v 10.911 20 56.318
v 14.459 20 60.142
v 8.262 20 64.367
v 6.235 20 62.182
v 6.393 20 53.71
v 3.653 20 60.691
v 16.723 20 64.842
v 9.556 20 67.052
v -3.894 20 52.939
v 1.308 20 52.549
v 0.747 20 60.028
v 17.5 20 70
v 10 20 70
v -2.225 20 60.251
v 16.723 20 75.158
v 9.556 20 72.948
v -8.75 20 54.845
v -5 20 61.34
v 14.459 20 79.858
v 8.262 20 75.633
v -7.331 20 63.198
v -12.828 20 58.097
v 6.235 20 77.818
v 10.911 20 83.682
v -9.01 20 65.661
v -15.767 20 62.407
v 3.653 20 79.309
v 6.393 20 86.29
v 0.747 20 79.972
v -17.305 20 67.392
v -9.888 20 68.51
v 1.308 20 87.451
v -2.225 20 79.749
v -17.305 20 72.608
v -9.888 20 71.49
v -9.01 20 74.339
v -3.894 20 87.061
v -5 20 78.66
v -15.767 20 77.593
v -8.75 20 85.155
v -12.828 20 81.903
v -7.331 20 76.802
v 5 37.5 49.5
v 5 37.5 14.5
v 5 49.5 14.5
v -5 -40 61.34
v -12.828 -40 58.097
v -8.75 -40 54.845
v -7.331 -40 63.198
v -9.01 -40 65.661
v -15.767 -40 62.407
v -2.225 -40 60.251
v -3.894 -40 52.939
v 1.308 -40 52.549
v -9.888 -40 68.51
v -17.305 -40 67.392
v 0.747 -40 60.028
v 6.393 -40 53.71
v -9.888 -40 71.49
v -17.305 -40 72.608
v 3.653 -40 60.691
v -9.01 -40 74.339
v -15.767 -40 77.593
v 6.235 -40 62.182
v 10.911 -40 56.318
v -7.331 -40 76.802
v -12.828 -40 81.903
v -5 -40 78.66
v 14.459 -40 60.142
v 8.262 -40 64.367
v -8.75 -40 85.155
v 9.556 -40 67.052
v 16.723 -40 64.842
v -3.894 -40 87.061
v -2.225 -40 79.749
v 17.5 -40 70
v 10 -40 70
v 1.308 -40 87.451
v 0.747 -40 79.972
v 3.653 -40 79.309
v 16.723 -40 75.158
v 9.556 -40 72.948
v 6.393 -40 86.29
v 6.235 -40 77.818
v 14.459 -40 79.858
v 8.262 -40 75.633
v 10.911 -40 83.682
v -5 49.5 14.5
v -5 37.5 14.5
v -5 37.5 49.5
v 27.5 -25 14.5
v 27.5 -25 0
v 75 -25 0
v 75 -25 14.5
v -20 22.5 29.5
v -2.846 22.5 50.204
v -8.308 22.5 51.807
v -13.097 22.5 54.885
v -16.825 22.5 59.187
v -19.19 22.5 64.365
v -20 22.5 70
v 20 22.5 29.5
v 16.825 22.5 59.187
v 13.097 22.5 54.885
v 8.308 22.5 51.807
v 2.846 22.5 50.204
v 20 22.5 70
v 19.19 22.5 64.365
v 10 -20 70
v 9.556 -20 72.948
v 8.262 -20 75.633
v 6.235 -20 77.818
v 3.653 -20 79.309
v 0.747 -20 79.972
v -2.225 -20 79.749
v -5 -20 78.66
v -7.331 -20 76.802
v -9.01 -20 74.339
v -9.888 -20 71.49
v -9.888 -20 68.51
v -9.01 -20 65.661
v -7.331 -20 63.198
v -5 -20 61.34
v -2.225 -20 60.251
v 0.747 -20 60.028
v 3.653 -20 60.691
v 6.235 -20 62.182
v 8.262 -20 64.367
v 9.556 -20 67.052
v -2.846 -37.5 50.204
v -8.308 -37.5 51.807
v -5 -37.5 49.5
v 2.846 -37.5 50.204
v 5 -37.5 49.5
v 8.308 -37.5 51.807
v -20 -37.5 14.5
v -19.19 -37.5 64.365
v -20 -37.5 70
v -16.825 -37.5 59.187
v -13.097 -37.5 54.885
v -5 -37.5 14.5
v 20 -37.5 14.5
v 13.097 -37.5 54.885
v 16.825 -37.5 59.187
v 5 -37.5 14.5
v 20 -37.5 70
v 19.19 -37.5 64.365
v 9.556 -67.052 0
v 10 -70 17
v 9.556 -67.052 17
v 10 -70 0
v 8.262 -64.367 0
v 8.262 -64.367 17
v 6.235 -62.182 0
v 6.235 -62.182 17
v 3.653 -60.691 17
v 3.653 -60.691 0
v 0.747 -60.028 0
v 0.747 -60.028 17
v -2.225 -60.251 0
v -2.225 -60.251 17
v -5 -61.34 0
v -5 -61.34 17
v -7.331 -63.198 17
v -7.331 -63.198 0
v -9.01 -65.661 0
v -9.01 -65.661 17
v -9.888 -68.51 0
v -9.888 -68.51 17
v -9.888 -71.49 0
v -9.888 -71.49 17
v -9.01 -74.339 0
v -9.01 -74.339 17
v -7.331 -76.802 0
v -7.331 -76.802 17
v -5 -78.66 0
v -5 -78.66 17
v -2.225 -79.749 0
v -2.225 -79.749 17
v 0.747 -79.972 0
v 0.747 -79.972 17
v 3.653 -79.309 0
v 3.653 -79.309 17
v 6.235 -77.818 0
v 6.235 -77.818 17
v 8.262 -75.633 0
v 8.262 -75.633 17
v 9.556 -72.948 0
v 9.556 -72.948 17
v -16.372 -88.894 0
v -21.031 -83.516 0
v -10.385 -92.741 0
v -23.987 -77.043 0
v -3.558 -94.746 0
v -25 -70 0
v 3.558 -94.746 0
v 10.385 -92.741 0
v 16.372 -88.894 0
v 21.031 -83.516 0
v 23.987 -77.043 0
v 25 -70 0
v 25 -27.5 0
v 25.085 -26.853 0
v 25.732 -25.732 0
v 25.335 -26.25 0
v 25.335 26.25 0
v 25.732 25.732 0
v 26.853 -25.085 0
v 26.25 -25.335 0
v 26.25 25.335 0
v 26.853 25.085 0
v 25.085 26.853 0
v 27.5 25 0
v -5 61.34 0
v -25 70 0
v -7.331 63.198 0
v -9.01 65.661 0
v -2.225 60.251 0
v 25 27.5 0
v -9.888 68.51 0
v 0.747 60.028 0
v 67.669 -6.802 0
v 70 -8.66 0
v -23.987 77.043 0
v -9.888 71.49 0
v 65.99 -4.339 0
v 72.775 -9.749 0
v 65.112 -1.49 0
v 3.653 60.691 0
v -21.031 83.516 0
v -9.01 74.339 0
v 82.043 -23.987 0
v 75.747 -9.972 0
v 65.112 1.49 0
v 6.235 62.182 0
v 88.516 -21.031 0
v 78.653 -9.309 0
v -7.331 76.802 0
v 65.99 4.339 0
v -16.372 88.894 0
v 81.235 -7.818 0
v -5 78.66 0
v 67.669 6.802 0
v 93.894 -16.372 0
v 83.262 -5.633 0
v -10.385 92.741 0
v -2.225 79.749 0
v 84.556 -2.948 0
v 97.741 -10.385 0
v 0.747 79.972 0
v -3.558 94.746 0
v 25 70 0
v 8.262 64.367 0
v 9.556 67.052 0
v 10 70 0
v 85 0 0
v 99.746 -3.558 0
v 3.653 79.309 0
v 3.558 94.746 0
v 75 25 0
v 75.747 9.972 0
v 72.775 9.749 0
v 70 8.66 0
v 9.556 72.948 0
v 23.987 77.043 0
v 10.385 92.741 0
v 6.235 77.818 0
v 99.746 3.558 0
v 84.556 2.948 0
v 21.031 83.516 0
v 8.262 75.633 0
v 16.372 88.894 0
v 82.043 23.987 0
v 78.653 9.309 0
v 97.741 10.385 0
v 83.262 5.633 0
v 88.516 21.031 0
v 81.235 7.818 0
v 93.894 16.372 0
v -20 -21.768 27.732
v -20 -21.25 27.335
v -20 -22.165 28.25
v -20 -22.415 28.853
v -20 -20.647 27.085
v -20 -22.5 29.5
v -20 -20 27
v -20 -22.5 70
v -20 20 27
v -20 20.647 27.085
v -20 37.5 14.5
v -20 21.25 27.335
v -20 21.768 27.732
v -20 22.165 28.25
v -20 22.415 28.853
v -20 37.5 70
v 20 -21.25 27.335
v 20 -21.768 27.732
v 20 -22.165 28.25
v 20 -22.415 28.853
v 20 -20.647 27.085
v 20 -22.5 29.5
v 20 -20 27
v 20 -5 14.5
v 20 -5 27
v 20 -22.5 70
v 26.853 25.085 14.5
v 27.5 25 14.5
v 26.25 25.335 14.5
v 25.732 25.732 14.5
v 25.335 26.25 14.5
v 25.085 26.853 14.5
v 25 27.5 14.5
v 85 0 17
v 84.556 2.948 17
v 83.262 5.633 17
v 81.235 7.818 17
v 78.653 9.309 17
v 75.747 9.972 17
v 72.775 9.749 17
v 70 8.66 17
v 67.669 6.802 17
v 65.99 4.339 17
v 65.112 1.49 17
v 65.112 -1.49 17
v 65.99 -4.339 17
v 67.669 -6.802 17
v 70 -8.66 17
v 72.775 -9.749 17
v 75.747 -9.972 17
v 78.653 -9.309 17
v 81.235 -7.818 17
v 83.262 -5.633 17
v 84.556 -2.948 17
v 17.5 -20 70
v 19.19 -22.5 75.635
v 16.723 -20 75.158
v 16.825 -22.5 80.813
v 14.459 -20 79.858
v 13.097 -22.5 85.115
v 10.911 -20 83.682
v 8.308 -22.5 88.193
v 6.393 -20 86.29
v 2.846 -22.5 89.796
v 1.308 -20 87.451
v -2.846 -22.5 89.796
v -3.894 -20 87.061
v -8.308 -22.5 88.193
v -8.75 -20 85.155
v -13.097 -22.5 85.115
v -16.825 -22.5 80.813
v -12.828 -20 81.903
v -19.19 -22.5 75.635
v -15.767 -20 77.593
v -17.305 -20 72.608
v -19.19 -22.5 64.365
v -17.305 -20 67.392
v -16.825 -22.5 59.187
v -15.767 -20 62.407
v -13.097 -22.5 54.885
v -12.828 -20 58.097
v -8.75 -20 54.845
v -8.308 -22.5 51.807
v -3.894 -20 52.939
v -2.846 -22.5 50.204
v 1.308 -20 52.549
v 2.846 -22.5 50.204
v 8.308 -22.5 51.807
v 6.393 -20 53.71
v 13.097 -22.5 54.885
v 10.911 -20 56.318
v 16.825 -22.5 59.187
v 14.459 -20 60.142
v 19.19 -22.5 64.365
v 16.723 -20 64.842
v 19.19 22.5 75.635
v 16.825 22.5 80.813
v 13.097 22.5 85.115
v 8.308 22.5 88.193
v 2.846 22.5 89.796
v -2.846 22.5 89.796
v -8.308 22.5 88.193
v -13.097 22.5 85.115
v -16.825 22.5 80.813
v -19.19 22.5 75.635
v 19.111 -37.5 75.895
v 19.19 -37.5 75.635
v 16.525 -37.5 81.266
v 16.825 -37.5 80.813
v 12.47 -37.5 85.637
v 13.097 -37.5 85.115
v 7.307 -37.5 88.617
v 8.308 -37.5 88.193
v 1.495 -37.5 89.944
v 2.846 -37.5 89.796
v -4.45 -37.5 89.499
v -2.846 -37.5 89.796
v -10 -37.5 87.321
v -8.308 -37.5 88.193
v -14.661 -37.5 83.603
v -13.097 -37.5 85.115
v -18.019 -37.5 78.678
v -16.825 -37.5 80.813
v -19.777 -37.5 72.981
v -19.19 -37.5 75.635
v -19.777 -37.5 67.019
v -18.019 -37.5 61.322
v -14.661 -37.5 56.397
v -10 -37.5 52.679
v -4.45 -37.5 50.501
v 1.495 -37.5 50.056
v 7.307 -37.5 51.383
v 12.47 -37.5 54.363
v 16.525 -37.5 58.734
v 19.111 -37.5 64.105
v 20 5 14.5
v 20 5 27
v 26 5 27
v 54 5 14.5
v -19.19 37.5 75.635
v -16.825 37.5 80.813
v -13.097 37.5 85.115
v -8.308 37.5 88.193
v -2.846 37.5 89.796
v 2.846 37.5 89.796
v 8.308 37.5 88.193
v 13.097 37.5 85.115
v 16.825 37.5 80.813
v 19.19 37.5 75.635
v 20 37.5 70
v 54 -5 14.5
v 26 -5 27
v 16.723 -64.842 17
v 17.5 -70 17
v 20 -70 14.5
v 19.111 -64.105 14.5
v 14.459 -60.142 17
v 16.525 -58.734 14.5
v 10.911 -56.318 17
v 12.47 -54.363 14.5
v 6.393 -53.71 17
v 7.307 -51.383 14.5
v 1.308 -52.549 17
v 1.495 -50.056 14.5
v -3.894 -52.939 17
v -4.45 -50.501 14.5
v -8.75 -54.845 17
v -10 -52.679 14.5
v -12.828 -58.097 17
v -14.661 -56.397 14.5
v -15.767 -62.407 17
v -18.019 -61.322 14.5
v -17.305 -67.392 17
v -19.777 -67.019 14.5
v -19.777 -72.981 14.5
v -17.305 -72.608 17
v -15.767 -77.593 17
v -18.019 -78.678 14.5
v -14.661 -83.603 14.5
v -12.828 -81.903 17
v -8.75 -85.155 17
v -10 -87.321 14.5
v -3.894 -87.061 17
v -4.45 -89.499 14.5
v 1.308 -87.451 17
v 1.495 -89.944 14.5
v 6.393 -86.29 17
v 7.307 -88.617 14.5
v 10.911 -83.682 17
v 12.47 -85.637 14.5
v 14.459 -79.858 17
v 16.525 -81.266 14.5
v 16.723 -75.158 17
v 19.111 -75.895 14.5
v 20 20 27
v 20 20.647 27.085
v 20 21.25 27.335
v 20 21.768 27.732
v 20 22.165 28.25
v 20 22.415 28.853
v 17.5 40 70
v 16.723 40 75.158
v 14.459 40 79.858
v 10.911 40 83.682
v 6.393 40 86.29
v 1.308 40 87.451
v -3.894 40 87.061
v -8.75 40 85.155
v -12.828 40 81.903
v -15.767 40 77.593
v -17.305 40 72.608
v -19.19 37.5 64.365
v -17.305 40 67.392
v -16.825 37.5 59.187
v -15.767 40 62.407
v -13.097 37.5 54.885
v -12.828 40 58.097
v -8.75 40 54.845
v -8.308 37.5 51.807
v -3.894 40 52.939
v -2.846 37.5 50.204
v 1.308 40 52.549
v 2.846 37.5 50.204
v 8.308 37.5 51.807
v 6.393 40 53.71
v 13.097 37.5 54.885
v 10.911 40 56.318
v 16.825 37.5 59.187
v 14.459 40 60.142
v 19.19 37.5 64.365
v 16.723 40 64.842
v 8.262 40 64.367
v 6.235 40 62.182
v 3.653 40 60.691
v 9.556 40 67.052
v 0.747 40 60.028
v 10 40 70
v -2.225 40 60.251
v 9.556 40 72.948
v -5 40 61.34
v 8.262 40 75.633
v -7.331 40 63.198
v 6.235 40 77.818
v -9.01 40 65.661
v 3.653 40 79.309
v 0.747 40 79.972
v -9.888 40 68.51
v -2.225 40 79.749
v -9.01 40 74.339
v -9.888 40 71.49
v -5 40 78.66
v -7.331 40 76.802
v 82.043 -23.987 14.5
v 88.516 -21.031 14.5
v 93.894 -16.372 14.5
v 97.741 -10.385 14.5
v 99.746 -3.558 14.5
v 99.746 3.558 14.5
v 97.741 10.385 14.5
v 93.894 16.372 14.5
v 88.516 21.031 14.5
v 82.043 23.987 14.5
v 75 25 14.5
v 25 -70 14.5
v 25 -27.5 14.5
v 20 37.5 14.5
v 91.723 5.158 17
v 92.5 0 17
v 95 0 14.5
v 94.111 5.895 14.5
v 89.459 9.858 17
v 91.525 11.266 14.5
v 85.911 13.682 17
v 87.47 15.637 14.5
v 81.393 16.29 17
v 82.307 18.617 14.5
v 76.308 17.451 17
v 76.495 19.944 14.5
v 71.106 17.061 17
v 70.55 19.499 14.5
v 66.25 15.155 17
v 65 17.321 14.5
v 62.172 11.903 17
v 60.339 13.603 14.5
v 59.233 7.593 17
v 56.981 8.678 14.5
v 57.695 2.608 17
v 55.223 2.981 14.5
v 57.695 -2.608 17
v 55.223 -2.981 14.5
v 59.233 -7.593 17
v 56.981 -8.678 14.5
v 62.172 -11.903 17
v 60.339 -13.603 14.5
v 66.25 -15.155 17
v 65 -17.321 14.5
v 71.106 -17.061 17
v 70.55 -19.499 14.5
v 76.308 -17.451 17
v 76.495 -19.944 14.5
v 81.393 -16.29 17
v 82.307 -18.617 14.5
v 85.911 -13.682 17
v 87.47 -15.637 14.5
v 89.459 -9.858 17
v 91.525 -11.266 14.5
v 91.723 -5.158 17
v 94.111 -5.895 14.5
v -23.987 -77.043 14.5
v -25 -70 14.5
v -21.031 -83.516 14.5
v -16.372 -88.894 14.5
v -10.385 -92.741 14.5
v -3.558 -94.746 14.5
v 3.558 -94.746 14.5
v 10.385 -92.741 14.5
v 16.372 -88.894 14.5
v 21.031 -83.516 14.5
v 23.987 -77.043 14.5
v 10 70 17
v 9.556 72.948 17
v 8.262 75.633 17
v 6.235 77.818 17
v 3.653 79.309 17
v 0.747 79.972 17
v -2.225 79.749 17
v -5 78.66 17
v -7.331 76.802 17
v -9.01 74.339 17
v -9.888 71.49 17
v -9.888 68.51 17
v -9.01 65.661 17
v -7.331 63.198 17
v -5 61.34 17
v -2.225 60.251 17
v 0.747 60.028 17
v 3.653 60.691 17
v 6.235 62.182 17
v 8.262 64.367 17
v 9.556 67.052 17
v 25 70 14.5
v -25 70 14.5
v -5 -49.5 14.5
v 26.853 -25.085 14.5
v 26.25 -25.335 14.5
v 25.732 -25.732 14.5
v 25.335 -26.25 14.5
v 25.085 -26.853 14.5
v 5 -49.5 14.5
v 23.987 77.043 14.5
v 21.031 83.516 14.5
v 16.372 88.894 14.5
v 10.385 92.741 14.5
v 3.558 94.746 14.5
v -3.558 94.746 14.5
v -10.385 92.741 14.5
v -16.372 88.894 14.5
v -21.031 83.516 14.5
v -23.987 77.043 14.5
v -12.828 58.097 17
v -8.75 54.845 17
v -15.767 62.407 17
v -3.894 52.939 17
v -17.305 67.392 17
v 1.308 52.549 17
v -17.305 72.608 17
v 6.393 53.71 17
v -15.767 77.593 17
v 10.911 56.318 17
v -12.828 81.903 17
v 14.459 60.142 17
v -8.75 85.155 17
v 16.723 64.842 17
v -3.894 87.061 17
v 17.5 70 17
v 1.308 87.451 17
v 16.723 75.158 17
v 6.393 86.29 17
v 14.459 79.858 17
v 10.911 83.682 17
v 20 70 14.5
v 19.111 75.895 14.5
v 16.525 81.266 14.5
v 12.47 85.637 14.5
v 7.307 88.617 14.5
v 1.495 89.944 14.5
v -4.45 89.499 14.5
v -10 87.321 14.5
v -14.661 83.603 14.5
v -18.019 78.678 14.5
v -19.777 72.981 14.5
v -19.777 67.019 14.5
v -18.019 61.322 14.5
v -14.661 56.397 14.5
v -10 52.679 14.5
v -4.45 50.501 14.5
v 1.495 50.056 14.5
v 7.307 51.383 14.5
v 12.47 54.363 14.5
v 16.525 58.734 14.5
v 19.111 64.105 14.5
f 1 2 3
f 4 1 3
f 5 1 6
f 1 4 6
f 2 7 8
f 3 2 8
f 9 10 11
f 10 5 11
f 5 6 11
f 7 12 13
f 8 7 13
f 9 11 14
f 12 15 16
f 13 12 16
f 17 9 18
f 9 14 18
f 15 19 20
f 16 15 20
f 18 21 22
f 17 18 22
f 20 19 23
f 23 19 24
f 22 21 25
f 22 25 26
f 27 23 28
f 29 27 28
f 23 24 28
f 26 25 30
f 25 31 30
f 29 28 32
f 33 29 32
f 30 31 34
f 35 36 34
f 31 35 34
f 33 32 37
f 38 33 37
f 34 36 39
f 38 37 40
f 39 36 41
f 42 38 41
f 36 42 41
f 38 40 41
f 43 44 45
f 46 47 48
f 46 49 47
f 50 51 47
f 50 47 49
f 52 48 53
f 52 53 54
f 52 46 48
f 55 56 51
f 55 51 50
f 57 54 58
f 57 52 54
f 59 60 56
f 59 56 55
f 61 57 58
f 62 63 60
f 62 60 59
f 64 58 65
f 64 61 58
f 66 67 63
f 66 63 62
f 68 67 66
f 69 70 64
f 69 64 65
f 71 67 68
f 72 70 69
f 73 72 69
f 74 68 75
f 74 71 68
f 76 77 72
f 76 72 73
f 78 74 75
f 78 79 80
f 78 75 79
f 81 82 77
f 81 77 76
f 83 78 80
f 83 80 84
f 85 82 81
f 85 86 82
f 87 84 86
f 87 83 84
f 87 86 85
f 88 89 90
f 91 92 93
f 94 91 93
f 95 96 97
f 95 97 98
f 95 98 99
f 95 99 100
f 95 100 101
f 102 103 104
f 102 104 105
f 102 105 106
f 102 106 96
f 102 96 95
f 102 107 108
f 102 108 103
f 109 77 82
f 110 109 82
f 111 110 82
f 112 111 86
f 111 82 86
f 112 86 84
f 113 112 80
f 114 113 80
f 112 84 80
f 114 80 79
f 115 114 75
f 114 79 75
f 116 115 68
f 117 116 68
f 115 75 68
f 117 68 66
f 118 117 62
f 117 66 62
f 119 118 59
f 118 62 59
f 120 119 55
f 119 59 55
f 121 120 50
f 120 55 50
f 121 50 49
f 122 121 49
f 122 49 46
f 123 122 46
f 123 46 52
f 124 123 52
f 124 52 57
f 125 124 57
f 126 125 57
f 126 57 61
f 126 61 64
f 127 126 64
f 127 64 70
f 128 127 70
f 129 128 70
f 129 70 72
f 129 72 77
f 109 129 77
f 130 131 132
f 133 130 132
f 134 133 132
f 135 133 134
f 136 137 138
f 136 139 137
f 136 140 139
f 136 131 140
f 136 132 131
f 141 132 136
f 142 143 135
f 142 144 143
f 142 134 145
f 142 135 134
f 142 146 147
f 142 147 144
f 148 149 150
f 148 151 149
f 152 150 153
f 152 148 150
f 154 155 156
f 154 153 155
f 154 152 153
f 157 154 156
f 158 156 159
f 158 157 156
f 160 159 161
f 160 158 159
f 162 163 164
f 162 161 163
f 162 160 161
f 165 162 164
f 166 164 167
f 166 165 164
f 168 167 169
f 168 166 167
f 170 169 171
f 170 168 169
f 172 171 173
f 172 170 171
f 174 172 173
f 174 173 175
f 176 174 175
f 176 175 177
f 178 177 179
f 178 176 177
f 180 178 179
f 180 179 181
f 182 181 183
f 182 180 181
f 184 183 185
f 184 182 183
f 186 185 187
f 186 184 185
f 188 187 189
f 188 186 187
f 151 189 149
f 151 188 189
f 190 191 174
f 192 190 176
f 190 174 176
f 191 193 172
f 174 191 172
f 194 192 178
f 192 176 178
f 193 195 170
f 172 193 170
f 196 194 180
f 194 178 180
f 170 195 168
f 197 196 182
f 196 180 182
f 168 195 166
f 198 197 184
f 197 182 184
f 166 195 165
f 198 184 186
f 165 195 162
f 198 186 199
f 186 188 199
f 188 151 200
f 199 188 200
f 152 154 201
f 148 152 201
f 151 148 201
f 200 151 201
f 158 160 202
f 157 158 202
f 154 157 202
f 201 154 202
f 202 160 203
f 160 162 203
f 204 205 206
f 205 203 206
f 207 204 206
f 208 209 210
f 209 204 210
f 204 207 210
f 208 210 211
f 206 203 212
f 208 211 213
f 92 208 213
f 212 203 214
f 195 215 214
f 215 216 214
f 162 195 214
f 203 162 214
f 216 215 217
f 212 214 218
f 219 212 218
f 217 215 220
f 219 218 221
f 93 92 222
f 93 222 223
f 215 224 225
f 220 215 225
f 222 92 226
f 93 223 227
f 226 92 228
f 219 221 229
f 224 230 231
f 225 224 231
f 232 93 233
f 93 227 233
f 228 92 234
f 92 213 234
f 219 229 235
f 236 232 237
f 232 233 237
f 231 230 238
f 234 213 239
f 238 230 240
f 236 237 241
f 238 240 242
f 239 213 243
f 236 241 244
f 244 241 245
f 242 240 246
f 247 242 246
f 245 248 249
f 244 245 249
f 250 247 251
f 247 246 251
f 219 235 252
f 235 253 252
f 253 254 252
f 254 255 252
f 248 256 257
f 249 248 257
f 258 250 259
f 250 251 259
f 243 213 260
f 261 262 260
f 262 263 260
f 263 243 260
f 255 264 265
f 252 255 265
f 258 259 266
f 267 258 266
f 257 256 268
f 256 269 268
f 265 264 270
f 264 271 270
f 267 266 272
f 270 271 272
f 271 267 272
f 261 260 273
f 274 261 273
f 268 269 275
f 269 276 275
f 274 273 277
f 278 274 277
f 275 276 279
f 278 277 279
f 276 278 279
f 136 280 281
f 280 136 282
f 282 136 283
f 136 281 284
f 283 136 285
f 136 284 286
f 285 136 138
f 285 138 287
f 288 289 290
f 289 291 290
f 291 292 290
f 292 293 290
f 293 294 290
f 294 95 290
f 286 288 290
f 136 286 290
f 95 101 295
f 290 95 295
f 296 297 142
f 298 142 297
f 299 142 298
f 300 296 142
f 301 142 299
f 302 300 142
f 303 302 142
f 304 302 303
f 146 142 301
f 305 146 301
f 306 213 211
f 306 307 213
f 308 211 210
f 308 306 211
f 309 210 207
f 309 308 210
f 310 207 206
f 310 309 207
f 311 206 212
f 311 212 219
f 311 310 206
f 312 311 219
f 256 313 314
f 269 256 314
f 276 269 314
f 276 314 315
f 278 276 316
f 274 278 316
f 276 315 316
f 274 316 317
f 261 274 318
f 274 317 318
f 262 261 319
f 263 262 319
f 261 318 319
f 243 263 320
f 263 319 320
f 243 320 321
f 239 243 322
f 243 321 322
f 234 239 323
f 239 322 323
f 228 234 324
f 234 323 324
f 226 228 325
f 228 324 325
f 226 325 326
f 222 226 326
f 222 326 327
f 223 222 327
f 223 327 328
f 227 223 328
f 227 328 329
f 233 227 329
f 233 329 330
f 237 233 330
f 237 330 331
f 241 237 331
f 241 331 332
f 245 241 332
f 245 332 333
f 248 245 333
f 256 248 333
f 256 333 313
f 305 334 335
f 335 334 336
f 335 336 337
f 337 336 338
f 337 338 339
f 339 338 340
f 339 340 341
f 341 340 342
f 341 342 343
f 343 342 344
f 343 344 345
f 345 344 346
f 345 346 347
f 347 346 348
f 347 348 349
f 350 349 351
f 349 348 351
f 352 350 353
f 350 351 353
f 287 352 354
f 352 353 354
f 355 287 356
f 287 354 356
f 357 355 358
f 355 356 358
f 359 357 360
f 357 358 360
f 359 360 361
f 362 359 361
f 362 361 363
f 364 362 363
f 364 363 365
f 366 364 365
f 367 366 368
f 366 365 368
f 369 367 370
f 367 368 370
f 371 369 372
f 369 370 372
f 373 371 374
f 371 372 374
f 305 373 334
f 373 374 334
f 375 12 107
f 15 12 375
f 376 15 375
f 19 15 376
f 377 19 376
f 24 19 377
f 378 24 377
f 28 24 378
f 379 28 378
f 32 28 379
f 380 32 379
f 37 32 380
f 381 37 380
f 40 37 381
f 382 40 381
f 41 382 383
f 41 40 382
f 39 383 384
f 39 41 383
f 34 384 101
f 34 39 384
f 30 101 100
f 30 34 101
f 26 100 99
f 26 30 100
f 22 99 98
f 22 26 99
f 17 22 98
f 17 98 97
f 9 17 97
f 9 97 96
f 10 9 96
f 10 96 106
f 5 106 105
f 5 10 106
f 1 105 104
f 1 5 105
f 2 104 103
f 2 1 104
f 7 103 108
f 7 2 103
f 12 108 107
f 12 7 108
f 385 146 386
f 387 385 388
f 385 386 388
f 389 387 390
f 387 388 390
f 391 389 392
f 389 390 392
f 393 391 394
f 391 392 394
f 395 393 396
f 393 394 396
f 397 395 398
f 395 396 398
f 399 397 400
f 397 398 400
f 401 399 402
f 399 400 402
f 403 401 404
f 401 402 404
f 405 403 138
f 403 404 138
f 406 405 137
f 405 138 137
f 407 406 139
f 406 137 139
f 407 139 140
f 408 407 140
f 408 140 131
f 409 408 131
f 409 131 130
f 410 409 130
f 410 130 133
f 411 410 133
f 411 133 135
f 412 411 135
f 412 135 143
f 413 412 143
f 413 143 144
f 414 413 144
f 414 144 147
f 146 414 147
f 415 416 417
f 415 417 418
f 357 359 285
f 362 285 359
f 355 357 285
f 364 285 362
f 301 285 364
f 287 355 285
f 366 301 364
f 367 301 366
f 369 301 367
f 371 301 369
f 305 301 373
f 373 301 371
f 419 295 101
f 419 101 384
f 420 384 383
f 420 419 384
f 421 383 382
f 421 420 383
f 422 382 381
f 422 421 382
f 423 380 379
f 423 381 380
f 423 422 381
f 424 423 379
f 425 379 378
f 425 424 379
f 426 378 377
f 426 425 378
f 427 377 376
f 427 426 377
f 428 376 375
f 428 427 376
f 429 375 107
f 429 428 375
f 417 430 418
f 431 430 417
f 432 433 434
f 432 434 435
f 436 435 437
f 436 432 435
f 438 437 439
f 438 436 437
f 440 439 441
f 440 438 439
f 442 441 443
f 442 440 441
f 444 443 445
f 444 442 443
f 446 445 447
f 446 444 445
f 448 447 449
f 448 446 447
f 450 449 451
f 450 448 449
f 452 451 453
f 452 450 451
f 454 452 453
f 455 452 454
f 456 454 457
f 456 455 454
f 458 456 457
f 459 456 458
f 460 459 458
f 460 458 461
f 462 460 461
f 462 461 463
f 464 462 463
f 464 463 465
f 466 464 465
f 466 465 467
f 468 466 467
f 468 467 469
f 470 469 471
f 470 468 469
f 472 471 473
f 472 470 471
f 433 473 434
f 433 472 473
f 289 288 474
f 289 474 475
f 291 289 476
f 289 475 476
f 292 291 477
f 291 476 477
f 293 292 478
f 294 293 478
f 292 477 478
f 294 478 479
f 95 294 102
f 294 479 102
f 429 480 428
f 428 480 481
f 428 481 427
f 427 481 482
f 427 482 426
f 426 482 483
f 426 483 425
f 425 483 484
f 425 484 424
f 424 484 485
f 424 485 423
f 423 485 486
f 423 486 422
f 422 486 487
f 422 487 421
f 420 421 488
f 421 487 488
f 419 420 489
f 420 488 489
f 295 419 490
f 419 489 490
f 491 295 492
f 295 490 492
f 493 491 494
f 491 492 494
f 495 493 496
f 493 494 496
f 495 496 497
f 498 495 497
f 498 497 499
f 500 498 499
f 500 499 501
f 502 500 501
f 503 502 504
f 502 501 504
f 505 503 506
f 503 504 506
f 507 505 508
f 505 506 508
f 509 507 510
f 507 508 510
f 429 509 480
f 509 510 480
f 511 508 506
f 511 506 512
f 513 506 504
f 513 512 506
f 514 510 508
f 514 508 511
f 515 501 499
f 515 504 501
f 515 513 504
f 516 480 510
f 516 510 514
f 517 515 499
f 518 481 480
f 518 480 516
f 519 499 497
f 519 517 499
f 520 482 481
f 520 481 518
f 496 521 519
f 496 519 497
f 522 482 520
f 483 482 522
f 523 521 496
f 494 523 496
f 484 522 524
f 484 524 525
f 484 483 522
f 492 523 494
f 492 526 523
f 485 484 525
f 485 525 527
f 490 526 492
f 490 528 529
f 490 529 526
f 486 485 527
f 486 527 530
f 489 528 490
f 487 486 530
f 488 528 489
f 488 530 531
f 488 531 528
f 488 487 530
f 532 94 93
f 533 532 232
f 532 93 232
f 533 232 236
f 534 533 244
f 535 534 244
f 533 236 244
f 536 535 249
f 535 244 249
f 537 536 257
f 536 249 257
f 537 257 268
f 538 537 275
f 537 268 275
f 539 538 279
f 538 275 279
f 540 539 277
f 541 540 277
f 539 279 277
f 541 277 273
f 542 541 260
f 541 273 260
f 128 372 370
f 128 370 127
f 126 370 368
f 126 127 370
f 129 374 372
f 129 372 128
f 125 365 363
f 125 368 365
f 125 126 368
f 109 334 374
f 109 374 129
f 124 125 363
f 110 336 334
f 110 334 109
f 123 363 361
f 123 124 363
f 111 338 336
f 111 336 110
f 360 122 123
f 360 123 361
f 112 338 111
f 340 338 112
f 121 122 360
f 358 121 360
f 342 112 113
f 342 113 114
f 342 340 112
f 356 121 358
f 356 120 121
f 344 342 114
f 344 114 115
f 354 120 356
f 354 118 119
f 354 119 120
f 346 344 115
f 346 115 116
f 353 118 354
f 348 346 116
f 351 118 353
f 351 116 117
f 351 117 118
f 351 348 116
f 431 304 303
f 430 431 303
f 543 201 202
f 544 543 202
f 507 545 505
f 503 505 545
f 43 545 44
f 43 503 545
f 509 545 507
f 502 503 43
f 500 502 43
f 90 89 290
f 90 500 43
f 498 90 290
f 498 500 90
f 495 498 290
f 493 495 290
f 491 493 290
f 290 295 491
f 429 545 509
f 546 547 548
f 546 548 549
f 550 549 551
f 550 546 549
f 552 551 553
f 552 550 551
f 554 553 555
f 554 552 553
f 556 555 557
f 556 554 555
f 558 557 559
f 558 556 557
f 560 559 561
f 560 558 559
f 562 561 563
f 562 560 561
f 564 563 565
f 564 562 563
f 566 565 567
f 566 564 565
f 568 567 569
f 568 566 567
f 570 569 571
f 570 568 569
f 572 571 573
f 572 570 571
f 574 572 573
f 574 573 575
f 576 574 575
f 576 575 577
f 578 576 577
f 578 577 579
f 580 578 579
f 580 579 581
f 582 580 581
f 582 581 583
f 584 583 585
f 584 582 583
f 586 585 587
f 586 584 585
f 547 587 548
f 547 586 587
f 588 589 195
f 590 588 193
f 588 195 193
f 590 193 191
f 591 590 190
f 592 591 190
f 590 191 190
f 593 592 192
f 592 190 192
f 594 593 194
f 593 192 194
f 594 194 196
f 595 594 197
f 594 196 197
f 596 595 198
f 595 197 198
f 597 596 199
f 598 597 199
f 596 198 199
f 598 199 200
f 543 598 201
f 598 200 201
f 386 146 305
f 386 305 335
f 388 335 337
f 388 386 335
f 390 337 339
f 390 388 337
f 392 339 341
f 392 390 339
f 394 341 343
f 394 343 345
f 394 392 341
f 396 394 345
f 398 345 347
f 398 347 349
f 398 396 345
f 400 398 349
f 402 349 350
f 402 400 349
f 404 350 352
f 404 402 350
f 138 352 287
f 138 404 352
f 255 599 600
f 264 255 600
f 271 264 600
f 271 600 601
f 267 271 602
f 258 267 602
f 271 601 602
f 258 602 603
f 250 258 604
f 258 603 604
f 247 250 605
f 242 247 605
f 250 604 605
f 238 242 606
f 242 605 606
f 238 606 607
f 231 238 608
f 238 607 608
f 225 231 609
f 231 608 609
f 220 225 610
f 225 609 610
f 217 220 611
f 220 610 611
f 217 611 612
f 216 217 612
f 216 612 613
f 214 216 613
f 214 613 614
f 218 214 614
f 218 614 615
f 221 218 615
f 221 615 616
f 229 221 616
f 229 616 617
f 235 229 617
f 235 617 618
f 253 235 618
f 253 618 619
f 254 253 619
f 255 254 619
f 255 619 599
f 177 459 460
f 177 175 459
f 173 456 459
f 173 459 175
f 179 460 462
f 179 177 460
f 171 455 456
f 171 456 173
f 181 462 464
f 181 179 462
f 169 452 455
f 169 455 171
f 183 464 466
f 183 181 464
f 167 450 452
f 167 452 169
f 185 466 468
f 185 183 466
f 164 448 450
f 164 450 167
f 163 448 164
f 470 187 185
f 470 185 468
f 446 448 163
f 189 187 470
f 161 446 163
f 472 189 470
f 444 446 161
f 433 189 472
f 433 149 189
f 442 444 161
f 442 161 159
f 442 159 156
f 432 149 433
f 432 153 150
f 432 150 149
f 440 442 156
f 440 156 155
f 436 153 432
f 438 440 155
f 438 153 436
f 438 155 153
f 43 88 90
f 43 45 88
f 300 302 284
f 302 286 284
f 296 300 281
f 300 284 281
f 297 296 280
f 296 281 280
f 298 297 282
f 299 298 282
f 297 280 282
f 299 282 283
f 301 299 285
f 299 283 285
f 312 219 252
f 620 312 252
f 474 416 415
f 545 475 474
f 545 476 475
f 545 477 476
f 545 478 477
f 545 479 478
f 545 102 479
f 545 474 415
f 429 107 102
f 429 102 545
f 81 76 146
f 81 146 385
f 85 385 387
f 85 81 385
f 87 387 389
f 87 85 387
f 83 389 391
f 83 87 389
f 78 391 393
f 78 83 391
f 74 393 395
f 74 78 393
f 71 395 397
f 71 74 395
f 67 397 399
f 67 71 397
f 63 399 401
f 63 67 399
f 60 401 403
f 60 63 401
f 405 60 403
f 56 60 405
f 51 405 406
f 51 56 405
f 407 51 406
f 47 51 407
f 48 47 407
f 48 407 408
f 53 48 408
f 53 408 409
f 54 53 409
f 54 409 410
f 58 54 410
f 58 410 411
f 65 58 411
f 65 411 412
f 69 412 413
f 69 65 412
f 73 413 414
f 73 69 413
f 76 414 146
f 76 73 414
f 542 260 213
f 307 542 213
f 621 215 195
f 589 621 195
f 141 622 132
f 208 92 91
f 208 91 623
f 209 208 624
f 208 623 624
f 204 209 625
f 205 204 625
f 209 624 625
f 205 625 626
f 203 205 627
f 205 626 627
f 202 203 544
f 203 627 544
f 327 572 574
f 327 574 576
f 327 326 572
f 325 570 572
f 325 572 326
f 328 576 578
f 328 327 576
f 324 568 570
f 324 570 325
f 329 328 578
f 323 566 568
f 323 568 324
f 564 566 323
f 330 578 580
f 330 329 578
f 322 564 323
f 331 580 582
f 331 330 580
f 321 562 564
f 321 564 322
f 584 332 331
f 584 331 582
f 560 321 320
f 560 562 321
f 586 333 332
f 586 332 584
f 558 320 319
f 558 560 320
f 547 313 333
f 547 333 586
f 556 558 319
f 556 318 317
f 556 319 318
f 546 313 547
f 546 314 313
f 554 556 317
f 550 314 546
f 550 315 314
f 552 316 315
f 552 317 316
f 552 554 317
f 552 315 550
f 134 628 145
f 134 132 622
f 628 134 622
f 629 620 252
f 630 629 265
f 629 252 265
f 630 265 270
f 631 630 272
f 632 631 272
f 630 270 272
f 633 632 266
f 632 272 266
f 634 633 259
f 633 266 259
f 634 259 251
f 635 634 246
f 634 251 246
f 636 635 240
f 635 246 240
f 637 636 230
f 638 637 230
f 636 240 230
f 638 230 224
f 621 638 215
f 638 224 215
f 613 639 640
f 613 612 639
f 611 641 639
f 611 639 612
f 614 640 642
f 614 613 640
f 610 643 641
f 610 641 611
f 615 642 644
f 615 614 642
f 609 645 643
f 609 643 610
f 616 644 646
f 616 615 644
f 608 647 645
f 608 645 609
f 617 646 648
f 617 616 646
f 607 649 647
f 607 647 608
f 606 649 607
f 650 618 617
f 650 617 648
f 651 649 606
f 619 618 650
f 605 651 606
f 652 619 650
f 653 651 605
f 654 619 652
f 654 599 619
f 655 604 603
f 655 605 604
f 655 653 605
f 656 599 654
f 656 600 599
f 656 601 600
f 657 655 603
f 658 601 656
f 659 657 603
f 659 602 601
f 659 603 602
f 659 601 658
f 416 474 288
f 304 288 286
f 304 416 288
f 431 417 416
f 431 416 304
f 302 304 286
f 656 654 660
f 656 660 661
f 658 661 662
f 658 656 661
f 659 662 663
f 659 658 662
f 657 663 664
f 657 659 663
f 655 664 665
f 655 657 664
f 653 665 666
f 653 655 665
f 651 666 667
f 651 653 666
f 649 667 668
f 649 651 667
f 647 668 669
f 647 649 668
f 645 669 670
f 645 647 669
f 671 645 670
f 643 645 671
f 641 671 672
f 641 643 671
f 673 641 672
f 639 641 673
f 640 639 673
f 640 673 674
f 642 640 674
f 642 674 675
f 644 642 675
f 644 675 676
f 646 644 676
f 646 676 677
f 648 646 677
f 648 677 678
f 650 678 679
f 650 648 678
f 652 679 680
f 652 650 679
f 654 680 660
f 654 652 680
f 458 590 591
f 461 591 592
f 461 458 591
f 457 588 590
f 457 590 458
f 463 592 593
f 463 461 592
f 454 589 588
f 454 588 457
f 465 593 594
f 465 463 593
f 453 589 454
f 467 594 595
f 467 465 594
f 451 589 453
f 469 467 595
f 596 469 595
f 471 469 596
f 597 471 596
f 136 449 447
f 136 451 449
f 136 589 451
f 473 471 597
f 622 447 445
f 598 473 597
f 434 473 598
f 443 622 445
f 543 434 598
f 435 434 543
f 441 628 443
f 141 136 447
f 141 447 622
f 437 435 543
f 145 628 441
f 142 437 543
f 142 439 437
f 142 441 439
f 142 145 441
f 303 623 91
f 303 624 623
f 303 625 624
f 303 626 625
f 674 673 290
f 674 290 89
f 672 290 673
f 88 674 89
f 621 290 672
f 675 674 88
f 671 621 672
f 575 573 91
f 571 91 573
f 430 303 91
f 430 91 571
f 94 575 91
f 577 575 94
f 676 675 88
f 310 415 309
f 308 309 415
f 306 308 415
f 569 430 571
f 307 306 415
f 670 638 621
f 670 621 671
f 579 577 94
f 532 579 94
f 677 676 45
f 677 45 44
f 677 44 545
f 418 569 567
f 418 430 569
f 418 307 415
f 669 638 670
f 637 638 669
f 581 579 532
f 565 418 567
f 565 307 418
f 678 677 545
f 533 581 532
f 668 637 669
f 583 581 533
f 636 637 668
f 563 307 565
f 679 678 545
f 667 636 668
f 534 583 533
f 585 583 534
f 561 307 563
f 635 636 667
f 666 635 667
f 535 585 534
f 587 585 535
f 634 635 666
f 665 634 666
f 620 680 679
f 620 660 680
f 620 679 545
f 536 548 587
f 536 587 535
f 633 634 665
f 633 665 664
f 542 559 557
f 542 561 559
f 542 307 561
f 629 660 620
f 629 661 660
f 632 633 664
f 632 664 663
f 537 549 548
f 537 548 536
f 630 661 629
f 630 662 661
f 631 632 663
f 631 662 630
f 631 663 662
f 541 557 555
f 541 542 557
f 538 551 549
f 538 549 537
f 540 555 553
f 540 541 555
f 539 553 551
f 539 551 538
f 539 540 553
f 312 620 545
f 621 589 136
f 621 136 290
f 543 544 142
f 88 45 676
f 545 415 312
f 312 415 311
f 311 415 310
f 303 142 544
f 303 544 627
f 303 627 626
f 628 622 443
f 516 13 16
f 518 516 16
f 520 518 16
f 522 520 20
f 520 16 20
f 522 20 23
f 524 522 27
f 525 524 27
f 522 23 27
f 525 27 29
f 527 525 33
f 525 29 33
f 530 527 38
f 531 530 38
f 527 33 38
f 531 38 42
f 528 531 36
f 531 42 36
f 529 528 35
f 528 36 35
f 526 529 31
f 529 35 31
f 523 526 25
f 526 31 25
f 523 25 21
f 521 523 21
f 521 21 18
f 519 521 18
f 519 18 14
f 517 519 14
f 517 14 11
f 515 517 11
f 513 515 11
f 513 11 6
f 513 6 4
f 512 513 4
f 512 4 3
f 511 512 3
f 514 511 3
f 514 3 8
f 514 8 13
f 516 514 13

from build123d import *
from build123d import SkipClean  # not in build123d's __all__

# Parameters (mm, degrees)
F1_DEPTH  = 14.5
F3_DEPTH  = 20
F5_DEPTH  = 5
F7_DEPTH  = 5
F9_DEPTH  = 2.5
F10_DEPTH = 15
F12_DEPTH = 2.5
F14_SIZE  = 2.49999
F16_DEPTH = 15
F18_DEPTH = 2.5
F22_R     = 20
F23_DEPTH = 2.5
F24_SIZE  = 2.49999
F25_R     = 10
F26_DEPTH = 17.001
F27_R     = 10
F28_DEPTH = 17.001
F29_R     = 10
F30_DEPTH = 135.001
F31_R     = 10
F32_DEPTH = 75.501
F33_R     = 10
F34_DEPTH = 90.001
F35_R     = 2.5


# Not quite as in the source:
# - a fillet or chamfer that OpenCascade refuses, or shapes differently, is made with other operations: its cross-section is extruded or revolved along the edge and cut away or added
# - a fillet or chamfer is up to 0.001 mm smaller than in the source, because OpenCascade refuses the exact size
# - a feature of the source that left no trace in its solid (it failed there, or was rolled back) is left out
# - a pattern or mirror of a feature is missing from the dataset's text; its kind, count and spacing are read off the source's solid


with BuildPart() as f1:
    # F0 (on Top) → F1 (new body)
    with BuildSketch(Plane.XY):
        with BuildLine():
            ThreePointArc((25, 70), (0, 95), (-25, 70))
            Line((-25, 70), (-25, -70))
            ThreePointArc((-25, -70), (0, -95), (25, -70))
            Line((25, -70), (25, -25))
            Line((25, -25), (75, -25))
            ThreePointArc((75, -25), (100, 0), (75, 25))
            Line((75, 25), (25, 25))
            Line((25, 25), (25, 70))
        make_face()
    extrude(amount=F1_DEPTH)

    # F2 (on Right) → F3 (join, symmetric)
    with BuildSketch(Plane.YZ):
        Polygon((-37.5, 70), (-37.5, 0), (37.5, 0), (37.5, 70), (22.5, 70), (22.5, 27), (-22.5, 27), (-22.5, 70), align=None)
    extrude(amount=F3_DEPTH, both=True)

    # F4 (on Right) → F5 (join, symmetric)
    with BuildSketch(Plane.YZ):
        Polygon((-37.5, 49.5), (-49.5, 14.5), (-37.5, 14.5), align=None)
        Polygon((37.5, 49.5), (37.5, 14.5), (49.5, 14.5), align=None)
    extrude(amount=F5_DEPTH, both=True)

    # F6 (on Front) → F7 (join, symmetric)
    with BuildSketch(Plane.XZ):
        Polygon((26, 27), (20, 27), (20, 14.5), (54, 14.5), align=None)
    extrude(amount=F7_DEPTH, both=True)

    # F8 (on face) → F9 (join)
    with BuildSketch(Plane.XZ.offset(37.5)):
        with BuildLine():
            ThreePointArc((-20, 70), (0, 50), (20, 70))
            Line((20, 70), (-20, 70))
        make_face()
        with BuildLine():
            Line((-20, 70), (20, 70))
            ThreePointArc((20, 70), (0, 90), (-20, 70))
        make_face()
    extrude(amount=F9_DEPTH)

    # F10 (add): a face of the model
    f10_faces = [f1.faces().sort_by_distance(p)[0] for p in [
        (0, -37.5, 78.4882636316),
    ]]
    extrude(f10_faces, amount=F10_DEPTH)

    # F11 (on face) → F12 (join)
    with BuildSketch(Plane(origin=(0, -22.5, 0), x_dir=(-1, 0, 0), z_dir=(0, 1, 0))):
        with BuildLine():
            ThreePointArc((-20, 70), (0, 50), (20, 70))
            ThreePointArc((20, 70), (0, 90), (-20, 70))
        make_face()
    f12 = extrude(amount=F12_DEPTH)

    # F12_copies: F12 across plane
    add(f12.mirror(Plane.ZX), clean=False)

    # F13: chamfer of 2.5 on 1 edges, made by hand

    # F13_s1 → F13_t2 (revolve, cut)
    with BuildSketch(Plane.XY.offset(70)):
        Polygon((20, -22.5), (17.5, -20), (20, -20), align=None)
    revolve(axis=Axis((0, -20, 70), (0, -1, 0)), mode=Mode.SUBTRACT)

    # F14 (size 2.5 in the source; OpenCascade refuses exactly that, so slightly less here)
    f14_edges = [f1.edges().sort_by_distance(p)[0] for p in [
        (-20, -40, 70),
    ]]
    chamfer(f14_edges, length=F14_SIZE)

    # F15 (on face) → F16 (join)
    with BuildSketch(Plane(origin=(0, 37.5, 0), x_dir=(-1, 0, 0), z_dir=(0, 1, 0))):
        with BuildLine():
            ThreePointArc((-20, 70), (0, 50), (20, 70))
            Line((20, 70), (-20, 70))
        make_face()
        with BuildLine():
            Line((-20, 70), (20, 70))
            ThreePointArc((20, 70), (0, 90), (-20, 70))
        make_face()
    extrude(amount=-F16_DEPTH)

    # F17 (on face) → F18 (join)
    with BuildSketch(Plane(origin=(0, 37.5, 0), x_dir=(-1, 0, 0), z_dir=(0, 1, 0))):
        with BuildLine():
            ThreePointArc((-20, 70), (0, 50), (20, 70))
            ThreePointArc((20, 70), (0, 90), (-20, 70))
        make_face()
    with SkipClean():  # cleaning this boolean's faces spoils the solid; the shape is the same uncleaned
        extrude(amount=F18_DEPTH)

    # F21: chamfer of 2.5 on 2 edges, made by hand

    # F21_s1 → F21_t2 (revolve, cut)
    with BuildSketch(Plane.XY.offset(70)):
        Polygon((20, 37.5), (17.5, 40), (20, 40), align=None)
    revolve(axis=Axis((0, 40, 70), (0, -1, 0)), mode=Mode.SUBTRACT)

    # F21_s3 → F21_t4 (revolve, cut)
    with BuildSketch(Plane.XY.offset(70)):
        Polygon((20, 22.5), (17.5, 20), (20, 20), align=None)
    revolve(axis=Axis((0, 20, 70), (0, -1, 0)), mode=Mode.SUBTRACT)

    # F22 (on face) → F23 (join)
    with BuildSketch(Plane.XY.offset(14.5)):
        with Locations((0, 70)):
            Circle(F22_R)
        with Locations((75, 0)):
            Circle(F22_R)
        with Locations((0, -70)):
            Circle(F22_R)
    extrude(amount=F23_DEPTH)

    # F24 (size 2.5 in the source; OpenCascade refuses exactly that, so slightly less here)
    f24_edges = [f1.edges().sort_by_distance(p)[0] for p in [
        (-20, 70, 17),
        (55, 0, 17),
        (-20, -70, 17),
    ]]
    chamfer(f24_edges, length=F24_SIZE)

    # F25 (on face) → F26 (cut, through all)
    with BuildSketch(Plane.XY.offset(17)):
        with Locations((0, 70)):
            Circle(F25_R)
    extrude(amount=-F26_DEPTH, mode=Mode.SUBTRACT)

    # F27 (on face) → F28 (cut, through all)
    with BuildSketch(Plane.XY.offset(17)):
        with Locations((75, 0)):
            Circle(F27_R)
    extrude(amount=-F28_DEPTH, mode=Mode.SUBTRACT)

    # F29 (on face) → F30 (cut, through all)
    with BuildSketch(Plane.XZ.offset(40)):
        with Locations((0, 70)):
            Circle(F29_R)
    extrude(amount=-F30_DEPTH, mode=Mode.SUBTRACT)

    # F31 (on face) → F32 (cut, through all)
    with BuildSketch(Plane.XY.offset(14.5)):
        with Locations((0, -70)):
            Circle(F31_R)
    extrude(amount=F32_DEPTH, mode=Mode.SUBTRACT)

    # F33 (on face) → F34 (cut, through all)
    with BuildSketch(Plane(origin=(0, 0, 0), x_dir=(1, 0, 0), z_dir=(0, 0, -1))):
        with Locations((0, 70)):
            Circle(F33_R)
    extrude(amount=-F34_DEPTH, mode=Mode.SUBTRACT)

    # F35
    f35_edges = [f1.edges().sort_by_distance(p)[0] for p in [
        (0, 22.5, 27),
        (0, -22.5, 27),
        (25, 25, 7.25),
        (25, -25, 7.25),
    ]]
    fillet(f35_edges, radius=F35_R)


solid = f1.part
